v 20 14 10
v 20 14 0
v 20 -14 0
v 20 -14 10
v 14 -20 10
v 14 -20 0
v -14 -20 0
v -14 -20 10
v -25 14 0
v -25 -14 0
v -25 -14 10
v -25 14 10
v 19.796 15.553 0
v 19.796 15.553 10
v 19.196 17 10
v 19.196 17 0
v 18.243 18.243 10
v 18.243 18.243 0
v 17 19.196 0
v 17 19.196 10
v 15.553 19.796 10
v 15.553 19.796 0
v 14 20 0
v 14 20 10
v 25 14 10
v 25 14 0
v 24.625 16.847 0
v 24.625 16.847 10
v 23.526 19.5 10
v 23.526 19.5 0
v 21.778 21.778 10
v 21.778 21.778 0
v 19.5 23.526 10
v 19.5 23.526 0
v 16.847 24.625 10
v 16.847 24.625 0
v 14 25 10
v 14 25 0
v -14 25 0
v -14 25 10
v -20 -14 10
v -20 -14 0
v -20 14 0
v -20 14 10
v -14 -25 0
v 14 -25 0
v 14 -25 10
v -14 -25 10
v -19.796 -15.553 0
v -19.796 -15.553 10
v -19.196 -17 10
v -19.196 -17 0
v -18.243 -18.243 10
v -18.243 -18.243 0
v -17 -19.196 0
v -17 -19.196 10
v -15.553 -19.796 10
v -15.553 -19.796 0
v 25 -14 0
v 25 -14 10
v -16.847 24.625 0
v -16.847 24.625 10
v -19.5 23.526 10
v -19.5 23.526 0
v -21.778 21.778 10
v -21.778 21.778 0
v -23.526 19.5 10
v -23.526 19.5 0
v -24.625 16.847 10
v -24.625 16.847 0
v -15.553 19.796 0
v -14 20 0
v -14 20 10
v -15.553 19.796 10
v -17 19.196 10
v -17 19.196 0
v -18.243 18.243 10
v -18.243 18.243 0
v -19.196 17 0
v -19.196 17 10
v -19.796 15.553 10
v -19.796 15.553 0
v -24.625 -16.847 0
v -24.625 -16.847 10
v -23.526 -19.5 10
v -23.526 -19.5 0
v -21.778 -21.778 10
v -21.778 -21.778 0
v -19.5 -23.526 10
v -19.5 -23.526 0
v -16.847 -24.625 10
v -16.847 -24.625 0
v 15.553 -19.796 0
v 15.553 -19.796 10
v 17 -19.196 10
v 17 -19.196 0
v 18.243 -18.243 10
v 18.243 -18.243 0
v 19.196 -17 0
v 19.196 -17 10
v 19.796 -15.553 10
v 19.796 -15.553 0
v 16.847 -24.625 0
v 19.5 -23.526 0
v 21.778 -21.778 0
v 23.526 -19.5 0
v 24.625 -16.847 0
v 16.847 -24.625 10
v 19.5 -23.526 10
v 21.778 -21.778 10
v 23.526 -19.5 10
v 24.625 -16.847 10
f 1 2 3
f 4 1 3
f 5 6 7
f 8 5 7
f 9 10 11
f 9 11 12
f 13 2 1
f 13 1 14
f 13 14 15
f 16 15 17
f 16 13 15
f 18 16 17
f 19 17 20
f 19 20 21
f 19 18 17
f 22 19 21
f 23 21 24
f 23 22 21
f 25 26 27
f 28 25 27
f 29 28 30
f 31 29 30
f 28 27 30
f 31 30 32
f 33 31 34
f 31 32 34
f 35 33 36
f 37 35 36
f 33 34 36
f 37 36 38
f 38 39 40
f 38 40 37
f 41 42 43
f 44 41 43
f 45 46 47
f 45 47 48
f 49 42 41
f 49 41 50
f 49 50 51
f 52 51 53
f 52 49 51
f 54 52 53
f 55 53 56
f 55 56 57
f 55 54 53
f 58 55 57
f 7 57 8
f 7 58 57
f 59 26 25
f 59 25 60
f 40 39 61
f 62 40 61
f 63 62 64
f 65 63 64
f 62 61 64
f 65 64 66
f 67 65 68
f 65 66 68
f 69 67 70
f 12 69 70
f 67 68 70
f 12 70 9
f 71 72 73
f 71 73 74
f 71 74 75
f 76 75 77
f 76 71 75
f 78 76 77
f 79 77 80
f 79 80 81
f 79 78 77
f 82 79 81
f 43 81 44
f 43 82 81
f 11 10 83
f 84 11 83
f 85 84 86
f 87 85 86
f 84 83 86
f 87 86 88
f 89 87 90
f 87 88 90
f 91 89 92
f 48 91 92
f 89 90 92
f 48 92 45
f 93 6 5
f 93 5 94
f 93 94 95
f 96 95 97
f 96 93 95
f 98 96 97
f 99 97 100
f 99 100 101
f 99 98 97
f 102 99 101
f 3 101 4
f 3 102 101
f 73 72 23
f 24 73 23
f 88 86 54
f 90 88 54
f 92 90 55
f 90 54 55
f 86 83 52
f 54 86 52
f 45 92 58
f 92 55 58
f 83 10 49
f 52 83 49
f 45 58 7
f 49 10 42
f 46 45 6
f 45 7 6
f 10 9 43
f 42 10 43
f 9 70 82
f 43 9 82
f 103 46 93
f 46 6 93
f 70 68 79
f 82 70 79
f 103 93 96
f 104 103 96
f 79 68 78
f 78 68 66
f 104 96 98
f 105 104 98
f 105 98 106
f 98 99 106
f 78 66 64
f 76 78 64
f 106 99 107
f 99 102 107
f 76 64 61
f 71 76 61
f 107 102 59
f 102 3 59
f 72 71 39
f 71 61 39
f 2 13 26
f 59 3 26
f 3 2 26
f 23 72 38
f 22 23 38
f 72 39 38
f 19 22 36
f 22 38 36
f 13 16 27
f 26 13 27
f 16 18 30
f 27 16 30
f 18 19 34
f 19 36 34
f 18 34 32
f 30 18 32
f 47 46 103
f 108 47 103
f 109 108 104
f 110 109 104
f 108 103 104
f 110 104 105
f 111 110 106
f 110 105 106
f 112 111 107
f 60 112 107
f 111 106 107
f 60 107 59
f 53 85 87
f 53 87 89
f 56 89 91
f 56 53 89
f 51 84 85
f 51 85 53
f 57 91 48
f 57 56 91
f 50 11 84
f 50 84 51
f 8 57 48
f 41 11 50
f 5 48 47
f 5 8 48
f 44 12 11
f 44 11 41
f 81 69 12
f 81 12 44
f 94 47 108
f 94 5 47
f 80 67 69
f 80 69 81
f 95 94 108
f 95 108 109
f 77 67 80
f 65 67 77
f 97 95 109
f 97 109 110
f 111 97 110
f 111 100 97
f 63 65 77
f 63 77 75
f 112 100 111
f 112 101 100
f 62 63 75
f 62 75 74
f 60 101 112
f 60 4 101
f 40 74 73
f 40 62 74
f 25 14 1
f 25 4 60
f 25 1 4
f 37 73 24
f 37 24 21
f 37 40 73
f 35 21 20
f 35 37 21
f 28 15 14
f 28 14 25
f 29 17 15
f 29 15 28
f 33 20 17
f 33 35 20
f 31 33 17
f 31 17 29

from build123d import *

# Parameters (mm, degrees)
PAD_DEPTH = 10


with BuildPart() as part:
    # Sketch → Pad (new body)
    with BuildSketch(Plane.XY):
        with BuildLine():
            ThreePointArc((-14, 25), (-21.778175, 21.778175), (-25, 14))
            Line((-25, -14), (-25, 14))
            ThreePointArc((-25, -14), (-21.778175, -21.778175), (-14, -25))
            Line((14, -25), (-14, -25))
            ThreePointArc((14, -25), (21.778175, -21.778175), (25, -14))
            Line((25, 14), (25, -14))
            ThreePointArc((25, 14), (21.778175, 21.778175), (14, 25))
            Line((-14, 25), (14, 25))
        make_face()
        with BuildLine():
            ThreePointArc((-14, 20), (-18.242641, 18.242641), (-20, 14))
            Line((-20, -14), (-20, 14))
            ThreePointArc((-20, -14), (-18.242641, -18.242641), (-14, -20))
            Line((14, -20), (-14, -20))
            ThreePointArc((14, -20), (18.242641, -18.242641), (20, -14))
            Line((20, 14), (20, -14))
            ThreePointArc((20, 14), (18.242641, 18.242641), (14, 20))
            Line((-14, 20), (14, 20))
        make_face(mode=Mode.SUBTRACT)
    extrude(amount=PAD_DEPTH)


solid = part.part
